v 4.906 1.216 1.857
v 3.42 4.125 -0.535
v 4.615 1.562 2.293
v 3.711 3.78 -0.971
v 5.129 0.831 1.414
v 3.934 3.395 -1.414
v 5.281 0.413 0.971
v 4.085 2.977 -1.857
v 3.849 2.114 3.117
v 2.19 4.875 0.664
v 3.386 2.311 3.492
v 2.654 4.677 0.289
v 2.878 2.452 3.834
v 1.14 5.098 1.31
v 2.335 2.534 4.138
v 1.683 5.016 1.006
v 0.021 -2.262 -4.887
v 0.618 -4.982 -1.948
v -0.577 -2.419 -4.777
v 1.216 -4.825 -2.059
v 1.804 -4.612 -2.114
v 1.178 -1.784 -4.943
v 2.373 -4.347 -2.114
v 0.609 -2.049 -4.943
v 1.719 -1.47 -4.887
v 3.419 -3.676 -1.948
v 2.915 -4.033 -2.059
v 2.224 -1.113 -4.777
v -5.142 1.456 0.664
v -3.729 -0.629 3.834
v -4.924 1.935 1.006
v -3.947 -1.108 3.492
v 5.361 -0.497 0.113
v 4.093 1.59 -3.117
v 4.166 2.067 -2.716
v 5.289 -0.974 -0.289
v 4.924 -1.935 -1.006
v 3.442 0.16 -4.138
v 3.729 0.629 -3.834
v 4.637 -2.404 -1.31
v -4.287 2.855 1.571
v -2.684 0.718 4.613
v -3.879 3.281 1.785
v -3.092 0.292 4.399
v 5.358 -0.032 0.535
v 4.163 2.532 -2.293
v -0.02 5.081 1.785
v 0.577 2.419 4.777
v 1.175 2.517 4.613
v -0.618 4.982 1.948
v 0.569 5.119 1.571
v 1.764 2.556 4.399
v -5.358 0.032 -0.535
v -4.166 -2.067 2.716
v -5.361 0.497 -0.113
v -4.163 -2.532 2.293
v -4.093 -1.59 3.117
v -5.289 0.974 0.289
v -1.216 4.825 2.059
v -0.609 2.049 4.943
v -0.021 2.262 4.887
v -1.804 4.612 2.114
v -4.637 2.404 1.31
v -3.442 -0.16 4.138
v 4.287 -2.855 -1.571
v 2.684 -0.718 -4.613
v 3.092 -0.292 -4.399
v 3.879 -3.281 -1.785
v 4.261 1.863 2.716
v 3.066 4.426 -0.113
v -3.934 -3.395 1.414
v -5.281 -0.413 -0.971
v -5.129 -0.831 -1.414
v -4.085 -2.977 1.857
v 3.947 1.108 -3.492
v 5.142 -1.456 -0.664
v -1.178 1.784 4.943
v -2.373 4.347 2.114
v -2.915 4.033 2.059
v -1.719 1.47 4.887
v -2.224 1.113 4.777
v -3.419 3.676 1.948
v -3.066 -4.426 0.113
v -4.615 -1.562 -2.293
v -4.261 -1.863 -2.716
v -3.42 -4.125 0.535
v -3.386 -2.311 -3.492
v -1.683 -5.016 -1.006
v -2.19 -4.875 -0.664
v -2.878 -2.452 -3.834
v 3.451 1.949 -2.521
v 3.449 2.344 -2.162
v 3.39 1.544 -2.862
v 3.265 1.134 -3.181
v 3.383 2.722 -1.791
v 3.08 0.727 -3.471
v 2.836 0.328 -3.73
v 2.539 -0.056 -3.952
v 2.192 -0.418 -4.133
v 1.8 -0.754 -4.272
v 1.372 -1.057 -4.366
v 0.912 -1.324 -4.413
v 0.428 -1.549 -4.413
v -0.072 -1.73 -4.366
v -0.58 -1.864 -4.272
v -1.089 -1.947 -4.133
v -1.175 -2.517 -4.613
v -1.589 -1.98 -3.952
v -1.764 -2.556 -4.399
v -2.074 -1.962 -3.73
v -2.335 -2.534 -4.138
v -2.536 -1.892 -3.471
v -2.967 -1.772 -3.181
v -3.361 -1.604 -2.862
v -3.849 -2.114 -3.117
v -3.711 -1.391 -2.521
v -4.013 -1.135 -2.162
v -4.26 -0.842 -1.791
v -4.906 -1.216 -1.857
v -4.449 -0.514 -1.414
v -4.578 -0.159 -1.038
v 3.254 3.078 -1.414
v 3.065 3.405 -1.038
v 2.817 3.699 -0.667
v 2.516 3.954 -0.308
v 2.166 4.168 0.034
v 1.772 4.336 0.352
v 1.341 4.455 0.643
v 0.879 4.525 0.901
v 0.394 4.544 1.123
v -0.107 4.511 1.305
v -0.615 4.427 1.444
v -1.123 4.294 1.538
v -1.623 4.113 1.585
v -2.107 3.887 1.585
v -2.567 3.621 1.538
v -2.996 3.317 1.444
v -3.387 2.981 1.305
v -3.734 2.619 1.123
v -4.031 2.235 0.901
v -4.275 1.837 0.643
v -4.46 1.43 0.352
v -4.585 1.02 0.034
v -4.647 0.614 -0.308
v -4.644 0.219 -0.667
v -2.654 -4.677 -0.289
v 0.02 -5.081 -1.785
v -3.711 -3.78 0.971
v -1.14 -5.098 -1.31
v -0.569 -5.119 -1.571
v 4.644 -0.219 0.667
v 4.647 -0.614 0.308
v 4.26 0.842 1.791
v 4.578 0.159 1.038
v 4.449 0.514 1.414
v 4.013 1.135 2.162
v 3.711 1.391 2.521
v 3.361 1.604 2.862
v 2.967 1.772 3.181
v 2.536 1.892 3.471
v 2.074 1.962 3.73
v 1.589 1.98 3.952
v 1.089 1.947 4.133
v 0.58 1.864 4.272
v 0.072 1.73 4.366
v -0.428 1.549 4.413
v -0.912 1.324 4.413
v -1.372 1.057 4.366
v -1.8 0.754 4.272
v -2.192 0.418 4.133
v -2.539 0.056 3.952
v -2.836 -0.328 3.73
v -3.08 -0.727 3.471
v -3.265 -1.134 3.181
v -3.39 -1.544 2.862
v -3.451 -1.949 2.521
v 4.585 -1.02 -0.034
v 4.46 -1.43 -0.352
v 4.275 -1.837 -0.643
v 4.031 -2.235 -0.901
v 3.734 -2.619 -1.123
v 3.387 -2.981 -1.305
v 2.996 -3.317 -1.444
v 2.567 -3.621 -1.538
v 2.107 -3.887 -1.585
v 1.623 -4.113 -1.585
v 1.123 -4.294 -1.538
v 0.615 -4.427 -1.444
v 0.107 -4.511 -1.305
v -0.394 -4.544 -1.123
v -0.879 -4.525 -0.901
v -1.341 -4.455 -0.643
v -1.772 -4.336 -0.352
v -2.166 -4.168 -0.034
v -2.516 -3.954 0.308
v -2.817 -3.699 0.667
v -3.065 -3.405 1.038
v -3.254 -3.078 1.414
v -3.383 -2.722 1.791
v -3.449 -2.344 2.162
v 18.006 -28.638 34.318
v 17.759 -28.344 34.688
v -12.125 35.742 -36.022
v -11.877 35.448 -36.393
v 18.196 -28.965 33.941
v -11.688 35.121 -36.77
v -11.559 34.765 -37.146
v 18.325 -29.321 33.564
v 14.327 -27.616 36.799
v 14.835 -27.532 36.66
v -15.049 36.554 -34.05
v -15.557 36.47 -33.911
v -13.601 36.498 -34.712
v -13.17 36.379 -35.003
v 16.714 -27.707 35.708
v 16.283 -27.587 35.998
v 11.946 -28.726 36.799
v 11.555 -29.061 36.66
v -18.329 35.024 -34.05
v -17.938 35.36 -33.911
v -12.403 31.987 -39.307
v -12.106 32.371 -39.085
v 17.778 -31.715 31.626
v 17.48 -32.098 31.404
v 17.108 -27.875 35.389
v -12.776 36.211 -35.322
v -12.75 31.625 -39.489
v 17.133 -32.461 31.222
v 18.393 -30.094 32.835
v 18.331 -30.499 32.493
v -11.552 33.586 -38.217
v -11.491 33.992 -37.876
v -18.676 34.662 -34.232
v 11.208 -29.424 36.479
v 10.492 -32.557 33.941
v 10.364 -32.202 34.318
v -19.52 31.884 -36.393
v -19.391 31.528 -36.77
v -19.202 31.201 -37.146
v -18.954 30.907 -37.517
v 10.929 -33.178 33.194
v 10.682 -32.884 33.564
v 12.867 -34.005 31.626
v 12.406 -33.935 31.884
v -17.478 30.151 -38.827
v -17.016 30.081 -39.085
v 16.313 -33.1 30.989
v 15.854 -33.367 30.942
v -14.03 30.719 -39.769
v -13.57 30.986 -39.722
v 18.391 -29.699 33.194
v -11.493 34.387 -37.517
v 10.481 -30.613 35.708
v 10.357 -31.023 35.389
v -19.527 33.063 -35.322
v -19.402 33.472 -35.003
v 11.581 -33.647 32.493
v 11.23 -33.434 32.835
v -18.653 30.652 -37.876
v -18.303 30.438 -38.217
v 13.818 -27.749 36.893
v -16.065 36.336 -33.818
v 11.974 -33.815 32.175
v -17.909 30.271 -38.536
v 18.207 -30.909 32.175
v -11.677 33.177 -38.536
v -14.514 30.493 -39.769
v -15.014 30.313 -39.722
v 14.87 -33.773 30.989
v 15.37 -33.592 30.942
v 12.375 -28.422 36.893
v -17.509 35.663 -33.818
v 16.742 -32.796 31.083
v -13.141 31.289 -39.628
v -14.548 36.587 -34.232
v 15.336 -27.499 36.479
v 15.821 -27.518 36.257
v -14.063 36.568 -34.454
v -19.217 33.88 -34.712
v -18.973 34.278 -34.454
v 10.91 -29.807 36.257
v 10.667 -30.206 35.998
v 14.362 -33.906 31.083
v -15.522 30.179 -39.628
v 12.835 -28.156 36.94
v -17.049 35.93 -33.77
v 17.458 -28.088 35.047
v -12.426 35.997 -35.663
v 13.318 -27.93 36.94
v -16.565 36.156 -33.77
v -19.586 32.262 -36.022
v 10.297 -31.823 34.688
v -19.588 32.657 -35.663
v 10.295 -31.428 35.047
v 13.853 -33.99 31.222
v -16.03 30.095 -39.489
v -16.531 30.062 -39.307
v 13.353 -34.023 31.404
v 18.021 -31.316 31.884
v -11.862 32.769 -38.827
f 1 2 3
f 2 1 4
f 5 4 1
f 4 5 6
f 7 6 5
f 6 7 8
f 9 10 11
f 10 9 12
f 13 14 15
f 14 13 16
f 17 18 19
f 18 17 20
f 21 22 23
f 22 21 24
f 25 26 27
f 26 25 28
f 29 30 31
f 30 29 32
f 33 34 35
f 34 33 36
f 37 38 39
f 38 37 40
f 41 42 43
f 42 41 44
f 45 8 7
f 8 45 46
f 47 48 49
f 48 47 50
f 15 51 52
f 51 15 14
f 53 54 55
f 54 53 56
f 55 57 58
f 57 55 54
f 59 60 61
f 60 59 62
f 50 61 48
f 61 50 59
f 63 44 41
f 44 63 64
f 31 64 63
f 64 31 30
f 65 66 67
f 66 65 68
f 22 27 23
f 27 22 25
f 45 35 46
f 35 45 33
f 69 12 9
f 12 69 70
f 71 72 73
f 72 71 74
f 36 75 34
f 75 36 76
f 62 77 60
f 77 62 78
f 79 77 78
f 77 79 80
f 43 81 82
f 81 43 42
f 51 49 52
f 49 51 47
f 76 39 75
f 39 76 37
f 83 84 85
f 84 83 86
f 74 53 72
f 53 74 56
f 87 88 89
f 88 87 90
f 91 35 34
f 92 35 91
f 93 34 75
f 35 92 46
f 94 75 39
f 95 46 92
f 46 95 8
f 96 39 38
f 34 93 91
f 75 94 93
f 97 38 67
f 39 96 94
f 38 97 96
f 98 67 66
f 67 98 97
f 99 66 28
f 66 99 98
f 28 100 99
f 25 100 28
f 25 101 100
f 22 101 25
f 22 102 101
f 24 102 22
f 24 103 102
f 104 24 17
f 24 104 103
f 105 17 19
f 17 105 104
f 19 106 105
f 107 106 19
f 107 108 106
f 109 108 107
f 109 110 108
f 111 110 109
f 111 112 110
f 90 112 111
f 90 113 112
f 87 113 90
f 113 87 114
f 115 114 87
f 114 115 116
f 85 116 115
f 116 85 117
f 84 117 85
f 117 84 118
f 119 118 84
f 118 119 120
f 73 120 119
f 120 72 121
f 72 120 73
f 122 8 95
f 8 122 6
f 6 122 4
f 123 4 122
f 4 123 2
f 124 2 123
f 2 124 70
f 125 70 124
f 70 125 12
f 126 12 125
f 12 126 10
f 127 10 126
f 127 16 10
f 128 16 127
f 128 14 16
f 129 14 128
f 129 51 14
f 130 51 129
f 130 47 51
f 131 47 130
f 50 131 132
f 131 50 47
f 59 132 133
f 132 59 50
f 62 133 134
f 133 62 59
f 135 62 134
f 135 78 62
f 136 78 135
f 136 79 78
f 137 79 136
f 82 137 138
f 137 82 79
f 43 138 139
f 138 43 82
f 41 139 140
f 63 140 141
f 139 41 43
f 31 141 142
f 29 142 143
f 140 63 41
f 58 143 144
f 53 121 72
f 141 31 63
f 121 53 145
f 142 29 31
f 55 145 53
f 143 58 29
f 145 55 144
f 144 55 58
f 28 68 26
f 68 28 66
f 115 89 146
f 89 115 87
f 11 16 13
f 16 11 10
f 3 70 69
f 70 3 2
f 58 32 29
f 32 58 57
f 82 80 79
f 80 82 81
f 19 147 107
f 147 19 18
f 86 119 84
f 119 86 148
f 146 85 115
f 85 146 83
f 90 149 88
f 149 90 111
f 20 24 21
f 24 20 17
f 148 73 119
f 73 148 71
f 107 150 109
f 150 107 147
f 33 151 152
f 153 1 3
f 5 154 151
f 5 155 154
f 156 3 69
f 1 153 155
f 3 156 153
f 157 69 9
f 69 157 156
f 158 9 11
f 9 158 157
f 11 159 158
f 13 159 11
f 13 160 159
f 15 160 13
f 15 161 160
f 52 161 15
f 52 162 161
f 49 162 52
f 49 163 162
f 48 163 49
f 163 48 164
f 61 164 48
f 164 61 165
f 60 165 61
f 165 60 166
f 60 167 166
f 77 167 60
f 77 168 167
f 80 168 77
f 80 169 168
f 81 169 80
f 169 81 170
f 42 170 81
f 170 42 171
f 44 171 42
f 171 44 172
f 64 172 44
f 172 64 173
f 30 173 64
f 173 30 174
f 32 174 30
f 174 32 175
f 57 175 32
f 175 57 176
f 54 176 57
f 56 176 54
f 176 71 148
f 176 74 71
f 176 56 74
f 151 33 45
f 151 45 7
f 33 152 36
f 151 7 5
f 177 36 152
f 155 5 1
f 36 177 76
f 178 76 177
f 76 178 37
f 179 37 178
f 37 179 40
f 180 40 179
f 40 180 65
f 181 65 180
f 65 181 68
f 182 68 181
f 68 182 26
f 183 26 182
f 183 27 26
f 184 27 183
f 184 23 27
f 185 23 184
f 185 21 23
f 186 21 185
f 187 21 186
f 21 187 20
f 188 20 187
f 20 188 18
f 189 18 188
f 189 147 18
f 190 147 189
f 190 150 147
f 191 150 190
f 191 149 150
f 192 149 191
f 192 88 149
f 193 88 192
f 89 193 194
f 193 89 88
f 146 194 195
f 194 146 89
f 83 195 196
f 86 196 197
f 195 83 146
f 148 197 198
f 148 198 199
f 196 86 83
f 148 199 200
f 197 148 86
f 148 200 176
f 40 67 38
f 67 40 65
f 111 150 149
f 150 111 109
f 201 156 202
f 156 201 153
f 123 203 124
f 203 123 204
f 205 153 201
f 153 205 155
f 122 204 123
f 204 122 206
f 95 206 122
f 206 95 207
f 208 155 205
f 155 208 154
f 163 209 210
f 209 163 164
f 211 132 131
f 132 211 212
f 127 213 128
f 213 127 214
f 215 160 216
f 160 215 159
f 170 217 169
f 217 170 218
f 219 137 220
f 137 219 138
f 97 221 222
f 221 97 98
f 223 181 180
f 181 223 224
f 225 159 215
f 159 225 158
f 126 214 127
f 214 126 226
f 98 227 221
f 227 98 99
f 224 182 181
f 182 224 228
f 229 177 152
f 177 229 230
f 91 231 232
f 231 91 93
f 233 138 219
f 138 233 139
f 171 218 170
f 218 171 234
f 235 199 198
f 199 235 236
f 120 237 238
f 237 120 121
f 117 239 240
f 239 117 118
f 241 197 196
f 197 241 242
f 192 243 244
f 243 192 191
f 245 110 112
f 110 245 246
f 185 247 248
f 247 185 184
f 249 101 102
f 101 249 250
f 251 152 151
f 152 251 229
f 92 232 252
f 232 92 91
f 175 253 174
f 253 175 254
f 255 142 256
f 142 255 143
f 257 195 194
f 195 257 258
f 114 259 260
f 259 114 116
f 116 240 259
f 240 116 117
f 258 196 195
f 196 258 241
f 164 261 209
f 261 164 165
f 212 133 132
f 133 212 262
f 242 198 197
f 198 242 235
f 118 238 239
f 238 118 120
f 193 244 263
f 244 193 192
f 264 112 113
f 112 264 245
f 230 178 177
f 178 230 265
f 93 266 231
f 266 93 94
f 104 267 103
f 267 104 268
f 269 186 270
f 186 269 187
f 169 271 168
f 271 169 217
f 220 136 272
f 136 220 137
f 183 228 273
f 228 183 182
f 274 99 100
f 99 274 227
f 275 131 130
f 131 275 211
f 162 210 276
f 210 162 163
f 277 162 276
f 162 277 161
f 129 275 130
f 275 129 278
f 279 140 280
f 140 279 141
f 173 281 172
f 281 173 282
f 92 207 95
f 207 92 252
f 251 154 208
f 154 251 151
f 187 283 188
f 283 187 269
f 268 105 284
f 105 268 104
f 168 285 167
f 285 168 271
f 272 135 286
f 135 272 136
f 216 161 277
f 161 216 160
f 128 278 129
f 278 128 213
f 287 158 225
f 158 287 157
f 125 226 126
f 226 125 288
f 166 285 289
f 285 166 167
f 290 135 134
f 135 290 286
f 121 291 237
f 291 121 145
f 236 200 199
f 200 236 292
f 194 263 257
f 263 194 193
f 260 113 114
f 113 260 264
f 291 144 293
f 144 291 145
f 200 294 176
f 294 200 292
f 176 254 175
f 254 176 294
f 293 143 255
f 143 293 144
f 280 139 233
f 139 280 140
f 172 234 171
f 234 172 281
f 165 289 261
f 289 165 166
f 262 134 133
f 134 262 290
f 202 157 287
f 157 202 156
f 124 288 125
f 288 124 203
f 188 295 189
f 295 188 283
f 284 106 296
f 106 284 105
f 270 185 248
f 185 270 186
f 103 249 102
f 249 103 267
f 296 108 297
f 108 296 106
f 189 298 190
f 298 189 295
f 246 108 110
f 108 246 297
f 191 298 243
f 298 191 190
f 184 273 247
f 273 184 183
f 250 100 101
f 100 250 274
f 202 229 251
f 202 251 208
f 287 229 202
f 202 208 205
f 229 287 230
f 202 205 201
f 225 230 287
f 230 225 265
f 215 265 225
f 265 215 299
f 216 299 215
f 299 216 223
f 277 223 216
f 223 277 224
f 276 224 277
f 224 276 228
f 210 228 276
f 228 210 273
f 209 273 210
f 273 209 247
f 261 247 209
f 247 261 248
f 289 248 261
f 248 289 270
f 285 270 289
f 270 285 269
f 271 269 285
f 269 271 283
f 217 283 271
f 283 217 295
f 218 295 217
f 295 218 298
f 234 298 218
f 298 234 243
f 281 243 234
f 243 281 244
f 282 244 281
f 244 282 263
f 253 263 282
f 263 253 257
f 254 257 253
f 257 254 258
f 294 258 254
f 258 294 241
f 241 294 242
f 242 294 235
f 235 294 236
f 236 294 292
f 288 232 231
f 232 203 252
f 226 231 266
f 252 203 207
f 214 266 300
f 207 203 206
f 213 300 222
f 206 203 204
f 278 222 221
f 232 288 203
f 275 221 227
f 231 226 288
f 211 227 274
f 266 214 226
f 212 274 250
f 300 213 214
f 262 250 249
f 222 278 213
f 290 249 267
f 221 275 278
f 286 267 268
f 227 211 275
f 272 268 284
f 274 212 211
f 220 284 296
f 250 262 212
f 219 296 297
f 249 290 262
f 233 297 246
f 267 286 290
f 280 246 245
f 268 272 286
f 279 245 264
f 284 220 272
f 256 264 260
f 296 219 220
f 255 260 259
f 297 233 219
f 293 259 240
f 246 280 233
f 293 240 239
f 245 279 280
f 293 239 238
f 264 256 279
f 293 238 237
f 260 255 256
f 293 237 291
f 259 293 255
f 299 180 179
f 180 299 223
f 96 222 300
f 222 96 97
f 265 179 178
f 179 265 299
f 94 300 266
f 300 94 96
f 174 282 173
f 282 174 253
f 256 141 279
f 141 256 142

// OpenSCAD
$fn = 50;

difference() {
	union() {
		translate(v = [0, 0, 0]) {
			rotate(a = [45, 0, 25]) {
				difference() {
					union() {
						translate(v = [0, 0, -2.0]) {
							union() {
								difference() {
									cylinder(h = 4.0, r = 5.0);
									cylinder(h = 4.0, r = 2.0);
								}
								difference() {
									translate(v = [0, 0, -50]) {
										cylinder(h = 100, r = 4.25);
									}
								}
							}
						}
					}
					union();
				}
			}
		}
	}
	union();
}
